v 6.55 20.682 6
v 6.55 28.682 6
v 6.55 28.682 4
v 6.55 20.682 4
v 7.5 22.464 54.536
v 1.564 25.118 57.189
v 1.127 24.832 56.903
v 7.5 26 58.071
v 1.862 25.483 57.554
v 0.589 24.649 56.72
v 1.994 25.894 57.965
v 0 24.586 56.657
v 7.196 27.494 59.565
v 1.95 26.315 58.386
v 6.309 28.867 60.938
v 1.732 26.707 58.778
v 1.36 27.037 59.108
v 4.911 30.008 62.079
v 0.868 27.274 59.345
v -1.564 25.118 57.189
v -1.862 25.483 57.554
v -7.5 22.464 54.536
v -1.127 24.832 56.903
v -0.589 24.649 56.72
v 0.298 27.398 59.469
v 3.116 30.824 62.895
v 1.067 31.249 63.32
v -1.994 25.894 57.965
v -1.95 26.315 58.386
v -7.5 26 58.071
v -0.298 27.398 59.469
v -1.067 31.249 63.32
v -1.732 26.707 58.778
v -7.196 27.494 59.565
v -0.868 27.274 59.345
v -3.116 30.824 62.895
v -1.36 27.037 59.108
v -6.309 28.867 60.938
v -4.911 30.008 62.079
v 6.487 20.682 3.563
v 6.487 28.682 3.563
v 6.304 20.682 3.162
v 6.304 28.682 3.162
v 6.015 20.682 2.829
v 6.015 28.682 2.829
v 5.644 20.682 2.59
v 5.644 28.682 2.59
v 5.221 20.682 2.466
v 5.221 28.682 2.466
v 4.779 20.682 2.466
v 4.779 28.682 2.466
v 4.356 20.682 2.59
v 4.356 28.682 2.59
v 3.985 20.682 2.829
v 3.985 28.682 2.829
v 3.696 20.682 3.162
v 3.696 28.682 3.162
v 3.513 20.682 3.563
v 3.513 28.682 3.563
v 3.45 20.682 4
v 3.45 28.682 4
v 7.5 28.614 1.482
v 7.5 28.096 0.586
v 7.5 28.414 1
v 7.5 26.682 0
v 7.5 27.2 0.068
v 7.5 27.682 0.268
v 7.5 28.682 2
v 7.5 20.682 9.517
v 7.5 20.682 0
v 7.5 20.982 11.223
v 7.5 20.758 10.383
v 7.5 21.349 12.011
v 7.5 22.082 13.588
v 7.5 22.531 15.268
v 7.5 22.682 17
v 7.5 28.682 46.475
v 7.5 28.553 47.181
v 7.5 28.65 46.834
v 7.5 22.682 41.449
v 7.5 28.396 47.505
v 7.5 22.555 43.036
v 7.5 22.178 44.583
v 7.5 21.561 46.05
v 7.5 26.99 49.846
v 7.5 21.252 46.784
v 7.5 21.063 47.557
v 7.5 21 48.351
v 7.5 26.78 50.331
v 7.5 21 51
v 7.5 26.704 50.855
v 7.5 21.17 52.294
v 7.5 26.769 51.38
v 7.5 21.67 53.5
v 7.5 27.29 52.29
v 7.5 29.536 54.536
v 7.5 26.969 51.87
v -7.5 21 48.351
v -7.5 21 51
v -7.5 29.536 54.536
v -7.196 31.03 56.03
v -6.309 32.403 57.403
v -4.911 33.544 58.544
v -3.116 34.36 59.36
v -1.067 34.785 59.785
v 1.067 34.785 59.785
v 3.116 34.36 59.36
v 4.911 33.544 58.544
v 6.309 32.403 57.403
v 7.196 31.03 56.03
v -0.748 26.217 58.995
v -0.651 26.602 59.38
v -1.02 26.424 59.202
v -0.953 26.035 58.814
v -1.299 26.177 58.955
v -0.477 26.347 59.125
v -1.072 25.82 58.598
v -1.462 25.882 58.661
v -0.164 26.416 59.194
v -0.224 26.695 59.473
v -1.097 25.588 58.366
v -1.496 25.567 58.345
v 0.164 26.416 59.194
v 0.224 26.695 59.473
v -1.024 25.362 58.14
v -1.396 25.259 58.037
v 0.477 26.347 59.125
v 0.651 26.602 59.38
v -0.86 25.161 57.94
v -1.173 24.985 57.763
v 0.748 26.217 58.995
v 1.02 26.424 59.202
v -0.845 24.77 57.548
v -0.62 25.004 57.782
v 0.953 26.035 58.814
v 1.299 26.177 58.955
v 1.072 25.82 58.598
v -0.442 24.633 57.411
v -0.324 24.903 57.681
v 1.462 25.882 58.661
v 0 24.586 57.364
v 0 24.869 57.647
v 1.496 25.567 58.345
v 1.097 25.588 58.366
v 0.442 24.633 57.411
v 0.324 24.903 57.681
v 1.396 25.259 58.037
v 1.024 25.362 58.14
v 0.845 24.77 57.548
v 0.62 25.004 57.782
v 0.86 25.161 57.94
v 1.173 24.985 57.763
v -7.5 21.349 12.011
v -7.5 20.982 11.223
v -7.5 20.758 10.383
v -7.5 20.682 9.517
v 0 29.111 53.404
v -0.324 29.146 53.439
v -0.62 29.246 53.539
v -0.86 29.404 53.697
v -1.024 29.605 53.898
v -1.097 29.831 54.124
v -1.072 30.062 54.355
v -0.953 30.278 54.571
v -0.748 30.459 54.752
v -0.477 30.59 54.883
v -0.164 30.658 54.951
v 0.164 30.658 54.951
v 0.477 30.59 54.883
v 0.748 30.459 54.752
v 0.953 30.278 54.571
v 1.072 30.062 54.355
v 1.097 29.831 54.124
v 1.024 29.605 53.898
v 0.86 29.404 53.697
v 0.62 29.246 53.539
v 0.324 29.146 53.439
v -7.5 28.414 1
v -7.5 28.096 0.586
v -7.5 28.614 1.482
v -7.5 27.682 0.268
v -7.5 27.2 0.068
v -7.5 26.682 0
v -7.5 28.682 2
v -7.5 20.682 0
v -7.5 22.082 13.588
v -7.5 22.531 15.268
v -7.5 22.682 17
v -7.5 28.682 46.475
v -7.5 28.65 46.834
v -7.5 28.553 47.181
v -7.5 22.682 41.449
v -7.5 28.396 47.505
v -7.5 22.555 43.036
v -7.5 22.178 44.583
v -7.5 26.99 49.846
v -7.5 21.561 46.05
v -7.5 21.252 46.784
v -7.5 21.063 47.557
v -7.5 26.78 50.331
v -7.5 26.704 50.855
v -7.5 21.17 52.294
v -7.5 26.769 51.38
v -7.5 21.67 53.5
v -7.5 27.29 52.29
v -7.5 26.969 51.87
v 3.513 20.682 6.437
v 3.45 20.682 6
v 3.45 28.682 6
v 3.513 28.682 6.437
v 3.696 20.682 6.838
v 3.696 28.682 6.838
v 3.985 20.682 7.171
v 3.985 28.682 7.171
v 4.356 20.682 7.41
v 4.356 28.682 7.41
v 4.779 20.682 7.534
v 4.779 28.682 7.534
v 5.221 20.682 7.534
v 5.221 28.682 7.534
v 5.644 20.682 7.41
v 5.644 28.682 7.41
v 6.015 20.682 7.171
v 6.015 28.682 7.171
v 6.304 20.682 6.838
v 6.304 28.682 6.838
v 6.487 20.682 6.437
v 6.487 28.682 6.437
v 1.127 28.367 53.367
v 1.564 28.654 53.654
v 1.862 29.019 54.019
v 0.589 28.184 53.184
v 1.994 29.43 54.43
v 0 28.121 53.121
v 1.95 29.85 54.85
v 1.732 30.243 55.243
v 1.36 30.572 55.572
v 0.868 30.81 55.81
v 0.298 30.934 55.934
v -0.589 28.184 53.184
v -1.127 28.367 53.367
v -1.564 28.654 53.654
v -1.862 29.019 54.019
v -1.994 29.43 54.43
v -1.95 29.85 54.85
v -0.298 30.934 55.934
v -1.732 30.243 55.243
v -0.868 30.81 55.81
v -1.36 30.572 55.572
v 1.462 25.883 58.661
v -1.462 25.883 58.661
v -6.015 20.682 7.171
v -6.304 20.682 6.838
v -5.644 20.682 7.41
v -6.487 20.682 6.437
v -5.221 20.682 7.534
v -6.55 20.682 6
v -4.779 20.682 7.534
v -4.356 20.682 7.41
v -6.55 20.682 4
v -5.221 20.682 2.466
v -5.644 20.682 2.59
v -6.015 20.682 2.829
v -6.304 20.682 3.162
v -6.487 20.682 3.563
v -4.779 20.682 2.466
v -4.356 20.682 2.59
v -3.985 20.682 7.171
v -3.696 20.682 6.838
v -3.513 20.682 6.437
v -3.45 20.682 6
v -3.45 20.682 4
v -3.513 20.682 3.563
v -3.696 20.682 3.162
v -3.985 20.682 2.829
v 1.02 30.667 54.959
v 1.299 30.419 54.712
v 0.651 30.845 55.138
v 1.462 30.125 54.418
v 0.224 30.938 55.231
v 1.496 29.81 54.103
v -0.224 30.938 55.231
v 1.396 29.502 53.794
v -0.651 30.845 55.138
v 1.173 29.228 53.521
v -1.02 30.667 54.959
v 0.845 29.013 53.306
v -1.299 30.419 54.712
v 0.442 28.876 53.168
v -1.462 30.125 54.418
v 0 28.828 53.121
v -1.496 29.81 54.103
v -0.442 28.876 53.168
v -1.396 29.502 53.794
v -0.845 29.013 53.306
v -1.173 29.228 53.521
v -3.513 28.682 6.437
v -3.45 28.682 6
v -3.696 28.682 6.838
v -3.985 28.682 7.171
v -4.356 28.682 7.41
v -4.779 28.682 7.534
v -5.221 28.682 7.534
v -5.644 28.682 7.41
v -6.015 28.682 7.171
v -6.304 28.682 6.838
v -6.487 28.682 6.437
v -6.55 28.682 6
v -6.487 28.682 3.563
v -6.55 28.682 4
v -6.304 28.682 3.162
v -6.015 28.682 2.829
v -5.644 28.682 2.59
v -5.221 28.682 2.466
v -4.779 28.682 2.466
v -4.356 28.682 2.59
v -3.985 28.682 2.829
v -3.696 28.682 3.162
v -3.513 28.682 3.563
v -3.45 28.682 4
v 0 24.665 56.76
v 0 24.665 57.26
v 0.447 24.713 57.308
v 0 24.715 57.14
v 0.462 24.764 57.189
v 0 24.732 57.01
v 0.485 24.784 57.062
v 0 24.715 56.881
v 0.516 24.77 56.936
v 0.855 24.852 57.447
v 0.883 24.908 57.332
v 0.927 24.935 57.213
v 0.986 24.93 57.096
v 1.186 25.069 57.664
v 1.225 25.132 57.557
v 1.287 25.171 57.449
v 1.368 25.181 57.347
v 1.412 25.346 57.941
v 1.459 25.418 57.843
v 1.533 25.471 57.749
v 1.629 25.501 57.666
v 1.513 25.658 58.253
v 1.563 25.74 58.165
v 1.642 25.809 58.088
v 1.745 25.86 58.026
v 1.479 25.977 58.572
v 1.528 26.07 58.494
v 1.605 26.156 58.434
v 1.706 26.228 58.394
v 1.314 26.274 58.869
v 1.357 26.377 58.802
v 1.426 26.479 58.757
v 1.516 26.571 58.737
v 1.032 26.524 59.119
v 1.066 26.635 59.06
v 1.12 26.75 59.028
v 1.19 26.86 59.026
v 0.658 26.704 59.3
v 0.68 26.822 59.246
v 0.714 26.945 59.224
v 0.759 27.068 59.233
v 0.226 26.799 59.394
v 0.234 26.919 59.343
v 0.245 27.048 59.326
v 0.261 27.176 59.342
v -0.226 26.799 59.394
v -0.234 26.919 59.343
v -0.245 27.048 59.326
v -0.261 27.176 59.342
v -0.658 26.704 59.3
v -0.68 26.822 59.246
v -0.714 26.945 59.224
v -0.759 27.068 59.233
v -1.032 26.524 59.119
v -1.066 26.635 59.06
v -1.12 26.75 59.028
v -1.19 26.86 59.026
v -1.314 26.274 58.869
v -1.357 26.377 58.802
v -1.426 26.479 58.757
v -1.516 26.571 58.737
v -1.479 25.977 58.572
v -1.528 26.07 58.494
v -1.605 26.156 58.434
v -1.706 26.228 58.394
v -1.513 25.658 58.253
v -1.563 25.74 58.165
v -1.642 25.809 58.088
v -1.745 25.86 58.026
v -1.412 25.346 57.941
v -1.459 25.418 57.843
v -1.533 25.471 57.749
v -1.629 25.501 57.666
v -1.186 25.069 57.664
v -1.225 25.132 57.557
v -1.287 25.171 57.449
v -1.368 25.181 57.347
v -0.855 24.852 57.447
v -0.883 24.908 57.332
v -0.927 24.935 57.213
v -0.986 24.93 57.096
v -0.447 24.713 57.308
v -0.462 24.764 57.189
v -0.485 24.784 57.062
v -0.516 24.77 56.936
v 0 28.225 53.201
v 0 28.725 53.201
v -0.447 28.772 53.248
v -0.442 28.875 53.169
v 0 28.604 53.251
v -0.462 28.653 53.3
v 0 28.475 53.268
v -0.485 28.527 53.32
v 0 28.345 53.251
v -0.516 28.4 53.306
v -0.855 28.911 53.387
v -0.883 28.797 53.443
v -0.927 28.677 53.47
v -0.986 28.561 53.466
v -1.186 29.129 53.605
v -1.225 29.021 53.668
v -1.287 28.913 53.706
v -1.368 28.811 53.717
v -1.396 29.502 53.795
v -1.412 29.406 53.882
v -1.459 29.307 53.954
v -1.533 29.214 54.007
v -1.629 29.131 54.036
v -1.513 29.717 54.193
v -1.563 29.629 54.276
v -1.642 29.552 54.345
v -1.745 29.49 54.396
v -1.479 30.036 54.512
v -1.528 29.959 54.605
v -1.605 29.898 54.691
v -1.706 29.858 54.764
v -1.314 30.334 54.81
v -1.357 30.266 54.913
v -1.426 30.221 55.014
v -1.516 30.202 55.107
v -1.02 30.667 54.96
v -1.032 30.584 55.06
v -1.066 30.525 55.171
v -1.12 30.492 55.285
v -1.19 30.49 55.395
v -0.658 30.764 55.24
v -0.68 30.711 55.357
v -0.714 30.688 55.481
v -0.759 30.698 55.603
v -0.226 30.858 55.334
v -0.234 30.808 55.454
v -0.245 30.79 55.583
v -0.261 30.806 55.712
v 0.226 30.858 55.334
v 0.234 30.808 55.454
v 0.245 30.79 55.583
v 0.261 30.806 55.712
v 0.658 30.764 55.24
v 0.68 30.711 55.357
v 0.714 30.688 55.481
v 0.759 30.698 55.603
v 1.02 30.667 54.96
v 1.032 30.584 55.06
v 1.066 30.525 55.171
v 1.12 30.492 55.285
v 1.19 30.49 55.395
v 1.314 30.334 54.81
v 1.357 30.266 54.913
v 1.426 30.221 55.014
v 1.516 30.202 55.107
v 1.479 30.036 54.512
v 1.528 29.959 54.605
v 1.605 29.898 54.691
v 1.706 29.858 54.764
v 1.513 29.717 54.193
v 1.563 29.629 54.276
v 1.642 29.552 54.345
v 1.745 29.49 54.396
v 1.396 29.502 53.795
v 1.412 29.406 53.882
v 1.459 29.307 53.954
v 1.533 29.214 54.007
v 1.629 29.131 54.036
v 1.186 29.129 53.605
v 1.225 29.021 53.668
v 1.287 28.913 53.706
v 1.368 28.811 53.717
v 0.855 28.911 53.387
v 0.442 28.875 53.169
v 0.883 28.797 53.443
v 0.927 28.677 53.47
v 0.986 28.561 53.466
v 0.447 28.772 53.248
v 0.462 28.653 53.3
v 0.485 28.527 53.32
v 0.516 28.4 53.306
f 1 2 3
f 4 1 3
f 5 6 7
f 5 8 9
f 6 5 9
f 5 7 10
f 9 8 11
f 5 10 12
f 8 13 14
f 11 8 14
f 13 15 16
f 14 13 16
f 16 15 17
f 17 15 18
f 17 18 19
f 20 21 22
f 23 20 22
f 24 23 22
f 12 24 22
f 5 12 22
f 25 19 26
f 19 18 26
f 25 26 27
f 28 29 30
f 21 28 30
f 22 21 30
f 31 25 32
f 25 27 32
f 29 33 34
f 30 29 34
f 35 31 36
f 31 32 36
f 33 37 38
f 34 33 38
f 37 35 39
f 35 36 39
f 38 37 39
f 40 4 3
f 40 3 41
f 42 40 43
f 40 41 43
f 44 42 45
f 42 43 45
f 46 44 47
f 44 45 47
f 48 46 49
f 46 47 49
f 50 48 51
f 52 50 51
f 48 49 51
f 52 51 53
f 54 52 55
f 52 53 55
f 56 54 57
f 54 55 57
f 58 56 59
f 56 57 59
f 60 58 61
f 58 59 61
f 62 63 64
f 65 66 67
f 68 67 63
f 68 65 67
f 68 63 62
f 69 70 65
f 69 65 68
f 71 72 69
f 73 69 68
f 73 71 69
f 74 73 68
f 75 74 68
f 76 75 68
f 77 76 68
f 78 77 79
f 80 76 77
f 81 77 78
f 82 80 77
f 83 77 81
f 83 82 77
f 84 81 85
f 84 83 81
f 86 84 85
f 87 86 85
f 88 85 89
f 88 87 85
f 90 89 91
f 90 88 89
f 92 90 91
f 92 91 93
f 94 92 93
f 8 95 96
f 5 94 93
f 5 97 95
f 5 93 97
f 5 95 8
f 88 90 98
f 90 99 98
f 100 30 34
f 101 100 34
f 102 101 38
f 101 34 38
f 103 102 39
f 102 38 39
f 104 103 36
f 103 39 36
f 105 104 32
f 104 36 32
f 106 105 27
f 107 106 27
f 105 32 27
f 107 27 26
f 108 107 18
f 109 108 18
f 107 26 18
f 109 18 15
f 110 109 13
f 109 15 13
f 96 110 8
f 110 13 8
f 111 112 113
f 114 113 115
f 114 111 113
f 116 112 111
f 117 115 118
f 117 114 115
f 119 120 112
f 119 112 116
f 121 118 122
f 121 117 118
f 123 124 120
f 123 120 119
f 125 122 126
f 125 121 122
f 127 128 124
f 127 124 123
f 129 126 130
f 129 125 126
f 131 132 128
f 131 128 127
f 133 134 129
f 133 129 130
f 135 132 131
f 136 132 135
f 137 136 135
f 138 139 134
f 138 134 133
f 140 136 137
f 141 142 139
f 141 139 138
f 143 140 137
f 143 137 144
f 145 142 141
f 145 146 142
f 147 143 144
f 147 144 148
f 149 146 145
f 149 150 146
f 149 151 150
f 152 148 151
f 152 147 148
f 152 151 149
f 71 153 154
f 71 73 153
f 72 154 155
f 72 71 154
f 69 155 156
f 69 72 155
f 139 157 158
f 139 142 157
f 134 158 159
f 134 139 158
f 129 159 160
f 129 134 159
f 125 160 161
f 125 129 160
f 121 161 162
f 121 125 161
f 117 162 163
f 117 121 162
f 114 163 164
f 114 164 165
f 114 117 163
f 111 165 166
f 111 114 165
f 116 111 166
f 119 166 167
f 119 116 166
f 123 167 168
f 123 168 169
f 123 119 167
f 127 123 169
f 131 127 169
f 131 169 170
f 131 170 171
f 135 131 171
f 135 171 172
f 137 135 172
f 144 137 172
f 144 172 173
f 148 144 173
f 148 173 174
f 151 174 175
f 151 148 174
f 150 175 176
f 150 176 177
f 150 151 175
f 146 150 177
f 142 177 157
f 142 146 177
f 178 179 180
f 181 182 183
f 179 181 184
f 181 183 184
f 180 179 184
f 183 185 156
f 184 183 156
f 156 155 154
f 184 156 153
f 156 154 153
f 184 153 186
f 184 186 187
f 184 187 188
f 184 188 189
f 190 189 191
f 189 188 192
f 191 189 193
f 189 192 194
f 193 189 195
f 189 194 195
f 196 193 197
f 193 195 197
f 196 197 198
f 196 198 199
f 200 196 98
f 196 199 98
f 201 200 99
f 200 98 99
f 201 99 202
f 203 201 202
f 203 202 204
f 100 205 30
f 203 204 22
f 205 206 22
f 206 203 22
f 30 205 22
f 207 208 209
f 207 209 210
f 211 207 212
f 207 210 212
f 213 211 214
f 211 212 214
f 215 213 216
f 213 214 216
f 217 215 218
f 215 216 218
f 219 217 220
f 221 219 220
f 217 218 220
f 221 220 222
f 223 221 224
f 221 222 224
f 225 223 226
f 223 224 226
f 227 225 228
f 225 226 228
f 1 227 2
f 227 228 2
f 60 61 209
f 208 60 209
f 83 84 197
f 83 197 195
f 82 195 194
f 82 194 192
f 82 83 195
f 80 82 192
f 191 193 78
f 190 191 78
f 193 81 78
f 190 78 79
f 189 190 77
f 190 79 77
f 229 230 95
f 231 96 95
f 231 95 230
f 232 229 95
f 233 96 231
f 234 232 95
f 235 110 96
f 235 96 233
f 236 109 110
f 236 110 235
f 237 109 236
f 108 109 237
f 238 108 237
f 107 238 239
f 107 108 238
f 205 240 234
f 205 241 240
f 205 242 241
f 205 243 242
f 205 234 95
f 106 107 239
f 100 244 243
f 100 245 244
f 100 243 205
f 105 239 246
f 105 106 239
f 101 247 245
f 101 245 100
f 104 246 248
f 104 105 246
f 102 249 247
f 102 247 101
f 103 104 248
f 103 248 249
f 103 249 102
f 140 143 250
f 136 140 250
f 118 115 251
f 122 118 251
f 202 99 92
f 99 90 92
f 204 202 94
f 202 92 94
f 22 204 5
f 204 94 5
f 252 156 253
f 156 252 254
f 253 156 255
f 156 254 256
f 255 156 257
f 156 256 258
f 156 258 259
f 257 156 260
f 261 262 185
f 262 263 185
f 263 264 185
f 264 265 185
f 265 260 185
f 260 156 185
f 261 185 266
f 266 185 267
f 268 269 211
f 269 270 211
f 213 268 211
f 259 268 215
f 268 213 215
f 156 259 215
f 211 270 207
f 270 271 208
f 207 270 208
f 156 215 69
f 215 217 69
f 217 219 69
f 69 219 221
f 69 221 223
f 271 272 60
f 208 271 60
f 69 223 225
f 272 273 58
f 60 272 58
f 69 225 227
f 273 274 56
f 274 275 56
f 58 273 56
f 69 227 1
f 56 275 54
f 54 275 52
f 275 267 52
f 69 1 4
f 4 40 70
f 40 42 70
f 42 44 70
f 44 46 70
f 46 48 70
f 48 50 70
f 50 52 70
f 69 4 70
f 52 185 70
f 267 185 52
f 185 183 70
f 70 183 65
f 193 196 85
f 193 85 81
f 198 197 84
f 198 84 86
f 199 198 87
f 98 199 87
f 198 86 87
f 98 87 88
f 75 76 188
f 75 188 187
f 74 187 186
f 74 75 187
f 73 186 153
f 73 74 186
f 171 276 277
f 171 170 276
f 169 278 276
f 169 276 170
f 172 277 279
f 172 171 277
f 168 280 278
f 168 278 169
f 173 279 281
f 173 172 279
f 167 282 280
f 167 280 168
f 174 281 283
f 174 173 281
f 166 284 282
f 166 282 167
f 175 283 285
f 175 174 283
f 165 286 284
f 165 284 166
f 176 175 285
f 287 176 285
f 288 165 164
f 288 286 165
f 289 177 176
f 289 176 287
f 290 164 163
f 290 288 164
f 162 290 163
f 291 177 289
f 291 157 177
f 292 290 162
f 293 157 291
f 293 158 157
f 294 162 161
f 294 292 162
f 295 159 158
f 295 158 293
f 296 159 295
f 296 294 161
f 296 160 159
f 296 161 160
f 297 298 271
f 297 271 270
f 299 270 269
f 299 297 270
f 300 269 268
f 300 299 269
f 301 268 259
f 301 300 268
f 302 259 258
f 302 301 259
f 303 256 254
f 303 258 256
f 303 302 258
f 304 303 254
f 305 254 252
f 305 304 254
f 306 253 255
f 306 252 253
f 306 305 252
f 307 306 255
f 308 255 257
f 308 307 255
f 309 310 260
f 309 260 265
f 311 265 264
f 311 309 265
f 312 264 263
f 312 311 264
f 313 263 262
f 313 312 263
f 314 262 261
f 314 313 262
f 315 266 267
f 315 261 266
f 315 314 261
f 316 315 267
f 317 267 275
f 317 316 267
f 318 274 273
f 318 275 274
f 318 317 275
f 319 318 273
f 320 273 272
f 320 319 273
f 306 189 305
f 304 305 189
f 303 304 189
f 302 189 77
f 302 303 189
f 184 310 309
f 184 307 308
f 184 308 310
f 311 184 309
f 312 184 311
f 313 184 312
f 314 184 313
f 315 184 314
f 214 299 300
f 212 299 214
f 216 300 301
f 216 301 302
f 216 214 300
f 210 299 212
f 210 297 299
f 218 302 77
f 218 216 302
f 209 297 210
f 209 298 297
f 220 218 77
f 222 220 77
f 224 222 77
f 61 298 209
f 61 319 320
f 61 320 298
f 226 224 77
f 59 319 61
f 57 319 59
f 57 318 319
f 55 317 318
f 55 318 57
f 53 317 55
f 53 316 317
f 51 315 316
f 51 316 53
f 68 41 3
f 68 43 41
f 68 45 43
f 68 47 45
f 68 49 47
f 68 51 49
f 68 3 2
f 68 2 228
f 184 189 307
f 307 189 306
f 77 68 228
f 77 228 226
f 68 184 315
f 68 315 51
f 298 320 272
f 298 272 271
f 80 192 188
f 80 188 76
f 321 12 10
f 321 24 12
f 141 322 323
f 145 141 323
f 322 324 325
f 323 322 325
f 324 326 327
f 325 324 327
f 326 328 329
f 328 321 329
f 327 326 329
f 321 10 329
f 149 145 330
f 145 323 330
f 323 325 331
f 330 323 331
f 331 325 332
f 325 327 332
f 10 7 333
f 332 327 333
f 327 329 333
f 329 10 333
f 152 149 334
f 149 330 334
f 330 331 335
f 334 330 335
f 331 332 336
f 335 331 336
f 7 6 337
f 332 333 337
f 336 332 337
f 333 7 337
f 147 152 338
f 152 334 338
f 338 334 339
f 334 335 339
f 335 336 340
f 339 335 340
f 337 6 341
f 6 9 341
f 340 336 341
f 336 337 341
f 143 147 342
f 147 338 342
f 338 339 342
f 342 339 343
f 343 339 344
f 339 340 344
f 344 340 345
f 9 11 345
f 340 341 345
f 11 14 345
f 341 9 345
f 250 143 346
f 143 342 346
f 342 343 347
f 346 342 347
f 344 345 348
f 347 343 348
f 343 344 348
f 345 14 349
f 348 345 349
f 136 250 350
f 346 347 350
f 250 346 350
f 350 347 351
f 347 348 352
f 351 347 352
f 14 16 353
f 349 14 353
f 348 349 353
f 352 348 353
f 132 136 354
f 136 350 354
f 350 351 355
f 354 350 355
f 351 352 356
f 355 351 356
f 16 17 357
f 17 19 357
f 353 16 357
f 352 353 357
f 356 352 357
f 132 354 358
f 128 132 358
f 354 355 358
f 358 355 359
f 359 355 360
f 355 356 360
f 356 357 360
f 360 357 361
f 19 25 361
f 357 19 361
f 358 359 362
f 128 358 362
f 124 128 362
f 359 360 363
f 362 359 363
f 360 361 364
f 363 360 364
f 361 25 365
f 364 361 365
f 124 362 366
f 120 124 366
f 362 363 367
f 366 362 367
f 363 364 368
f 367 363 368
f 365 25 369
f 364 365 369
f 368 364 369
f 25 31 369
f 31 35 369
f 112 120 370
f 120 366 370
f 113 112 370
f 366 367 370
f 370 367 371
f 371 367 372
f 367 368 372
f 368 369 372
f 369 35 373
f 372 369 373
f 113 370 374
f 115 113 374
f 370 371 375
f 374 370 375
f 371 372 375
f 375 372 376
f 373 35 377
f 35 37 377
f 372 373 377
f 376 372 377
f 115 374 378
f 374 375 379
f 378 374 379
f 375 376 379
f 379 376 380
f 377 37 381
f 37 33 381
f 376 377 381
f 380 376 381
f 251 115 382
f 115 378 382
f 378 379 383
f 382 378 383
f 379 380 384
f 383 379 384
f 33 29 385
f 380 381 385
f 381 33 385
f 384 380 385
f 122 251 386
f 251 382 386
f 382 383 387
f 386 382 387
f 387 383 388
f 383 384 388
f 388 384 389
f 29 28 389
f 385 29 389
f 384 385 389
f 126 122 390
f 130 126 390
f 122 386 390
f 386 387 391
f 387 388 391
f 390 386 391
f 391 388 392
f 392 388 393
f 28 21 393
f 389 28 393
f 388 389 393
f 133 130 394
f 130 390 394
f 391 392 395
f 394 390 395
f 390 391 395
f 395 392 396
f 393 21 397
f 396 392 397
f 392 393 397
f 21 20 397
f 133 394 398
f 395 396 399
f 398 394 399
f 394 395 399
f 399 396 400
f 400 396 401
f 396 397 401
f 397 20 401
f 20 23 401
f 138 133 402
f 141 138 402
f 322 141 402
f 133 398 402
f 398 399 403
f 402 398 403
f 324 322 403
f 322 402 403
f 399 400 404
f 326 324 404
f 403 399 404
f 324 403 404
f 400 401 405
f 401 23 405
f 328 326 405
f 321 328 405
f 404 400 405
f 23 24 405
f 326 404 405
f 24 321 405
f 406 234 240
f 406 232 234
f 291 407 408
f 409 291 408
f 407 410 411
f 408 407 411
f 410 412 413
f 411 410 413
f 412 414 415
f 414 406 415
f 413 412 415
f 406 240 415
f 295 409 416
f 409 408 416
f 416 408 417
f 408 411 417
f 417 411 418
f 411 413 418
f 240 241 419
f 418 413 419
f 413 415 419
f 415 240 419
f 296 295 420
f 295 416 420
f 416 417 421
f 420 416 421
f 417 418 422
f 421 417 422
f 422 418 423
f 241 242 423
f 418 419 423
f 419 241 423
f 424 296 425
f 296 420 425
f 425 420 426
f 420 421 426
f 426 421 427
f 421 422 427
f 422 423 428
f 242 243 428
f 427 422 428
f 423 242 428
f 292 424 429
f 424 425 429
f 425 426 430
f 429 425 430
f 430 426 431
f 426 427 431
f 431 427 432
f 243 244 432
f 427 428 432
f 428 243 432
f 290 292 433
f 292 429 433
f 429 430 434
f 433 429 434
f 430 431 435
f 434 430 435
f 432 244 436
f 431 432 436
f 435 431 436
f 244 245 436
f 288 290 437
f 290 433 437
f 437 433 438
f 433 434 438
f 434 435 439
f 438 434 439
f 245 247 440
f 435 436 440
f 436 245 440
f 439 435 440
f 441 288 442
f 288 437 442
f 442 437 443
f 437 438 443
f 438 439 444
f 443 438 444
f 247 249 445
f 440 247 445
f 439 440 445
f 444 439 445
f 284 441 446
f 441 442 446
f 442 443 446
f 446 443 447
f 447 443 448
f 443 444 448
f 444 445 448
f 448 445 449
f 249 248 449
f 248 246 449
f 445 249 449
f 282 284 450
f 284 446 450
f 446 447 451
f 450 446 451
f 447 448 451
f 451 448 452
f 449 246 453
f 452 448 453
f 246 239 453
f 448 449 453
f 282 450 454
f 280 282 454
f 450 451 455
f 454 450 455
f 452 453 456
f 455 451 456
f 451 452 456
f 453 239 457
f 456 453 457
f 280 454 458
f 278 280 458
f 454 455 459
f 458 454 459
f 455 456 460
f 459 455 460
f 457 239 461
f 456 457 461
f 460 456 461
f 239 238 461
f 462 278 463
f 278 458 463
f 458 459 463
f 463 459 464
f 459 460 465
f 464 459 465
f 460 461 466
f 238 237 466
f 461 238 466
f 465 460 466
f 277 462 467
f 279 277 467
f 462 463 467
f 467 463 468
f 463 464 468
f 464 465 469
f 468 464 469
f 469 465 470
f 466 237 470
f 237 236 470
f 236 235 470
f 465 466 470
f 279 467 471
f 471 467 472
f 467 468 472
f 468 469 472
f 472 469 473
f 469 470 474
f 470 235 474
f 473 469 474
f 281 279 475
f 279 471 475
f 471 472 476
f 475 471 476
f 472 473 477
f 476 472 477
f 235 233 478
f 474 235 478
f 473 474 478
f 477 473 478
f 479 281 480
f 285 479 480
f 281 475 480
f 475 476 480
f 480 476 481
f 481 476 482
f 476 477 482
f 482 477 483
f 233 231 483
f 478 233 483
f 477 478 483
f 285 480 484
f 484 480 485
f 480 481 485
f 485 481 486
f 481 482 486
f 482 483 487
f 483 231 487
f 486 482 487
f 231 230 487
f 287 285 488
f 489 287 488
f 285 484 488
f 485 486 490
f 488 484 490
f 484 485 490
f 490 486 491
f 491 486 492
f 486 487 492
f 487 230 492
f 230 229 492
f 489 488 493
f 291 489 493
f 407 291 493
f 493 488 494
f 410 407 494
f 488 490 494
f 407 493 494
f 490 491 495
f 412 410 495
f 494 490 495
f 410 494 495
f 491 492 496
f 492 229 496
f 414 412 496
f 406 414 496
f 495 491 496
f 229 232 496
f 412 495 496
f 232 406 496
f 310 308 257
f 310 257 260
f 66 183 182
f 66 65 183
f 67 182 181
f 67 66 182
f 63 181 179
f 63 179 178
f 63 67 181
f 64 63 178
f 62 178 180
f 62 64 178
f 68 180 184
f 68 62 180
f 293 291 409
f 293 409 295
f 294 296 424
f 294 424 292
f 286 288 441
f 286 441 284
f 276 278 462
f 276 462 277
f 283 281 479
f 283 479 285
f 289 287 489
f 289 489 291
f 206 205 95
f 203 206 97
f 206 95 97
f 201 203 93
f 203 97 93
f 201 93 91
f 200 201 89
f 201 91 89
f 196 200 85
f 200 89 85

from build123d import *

# Parameters (mm, degrees)
SKETCH_10_W         = 15
SKETCH_10_H         = 8
EXTRUDE_7_DEPTH     = 41
CUT_EXTRUDE_4_DEPTH = 11
SKETCH_12_W         = 15
SKETCH_12_H         = 6
EXTRUDE_8_DEPTH     = 6
SKETCH_14_W         = 15
SKETCH_14_H         = 5
EXTRUDE_9_DEPTH     = 4
EXTRUDE_10_DEPTH    = 15
EXTRUDE_11_DEPTH    = 5
SKETCH_19_R         = 1.1
CUT_EXTRUDE_5_DEPTH = 5
EXTRUDE_START       = 0.5
SKETCH_20_R         = 1.5
SKETCH_20_R_2       = 1.1
EXTRUDE_12_DEPTH    = 0.5
SKETCH_21_R         = 1.5
SKETCH_21_R_2       = 1.1
EXTRUDE_13_DEPTH    = 0.5
FILLET_4_R          = 0.5
CHAMFER_1_SIZE      = 4.493554602
CHAMFER_1_SIZE_2    = 2.7
FILLET_7_R          = 2
SKETCH_23_W         = 15
SKETCH_23_H         = 2
CUT_EXTRUDE_6_DEPTH = 30
FILLET_8_R          = 10
FILLET_9_R          = 5
FILLET_10_R         = 2


# Some blends are built 0.0001 mm under size
with BuildPart() as part:
    # 草图10 → 凸台-拉伸7 (new body)
    with BuildSketch(Plane.XY):
        with Locations((0, 24.68211788)):
            Rectangle(SKETCH_10_W, SKETCH_10_H)
    extrude(amount=EXTRUDE_7_DEPTH)

    # 草图11 → 切除-拉伸4 (cut)
    with BuildSketch(Plane(origin=(0, 28.68211788, 0), x_dir=(1, 0, 0), z_dir=(0, 1, 0))):
        with BuildLine():
            Line((-3.45, -4), (-3.45, -6))
            ThreePointArc((-3.45, -6), (-5, -7.55), (-6.55, -6))
            Line((-6.55, -6), (-6.55, -4))
            ThreePointArc((-6.55, -4), (-5, -2.45), (-3.45, -4))
        make_face()
        with BuildLine():
            Line((3.45, -4), (3.45, -6))
            ThreePointArc((3.45, -6), (5, -7.55), (6.55, -6))
            Line((6.55, -6), (6.55, -4))
            ThreePointArc((6.55, -4), (5, -2.45), (3.45, -4))
        make_face()
    extrude(amount=-CUT_EXTRUDE_4_DEPTH, mode=Mode.SUBTRACT)

    # 草图12 → 凸台-拉伸8 (add)
    with BuildSketch(Plane.XY.offset(41)):
        with Locations((0, 25.68211788)):
            Rectangle(SKETCH_12_W, SKETCH_12_H)
    extrude(amount=EXTRUDE_8_DEPTH)

    # 草图14 → 凸台-拉伸9 (add)
    with BuildSketch(Plane.XY.offset(47)):
        with Locations((0, 23.5)):
            Rectangle(SKETCH_14_W, SKETCH_14_H)
    extrude(amount=EXTRUDE_9_DEPTH)

    # 草图17 → 凸台-拉伸10 (add)
    with BuildSketch(Plane.ZY.offset(7.5)):
        Polygon((51, 26), (54.535533906, 29.535533906), (58.071067812, 26), (53.071067812, 21), (51, 21), align=None)
    extrude(amount=-EXTRUDE_10_DEPTH)

    # 草图18 → 凸台-拉伸11 (add)
    with BuildSketch(Plane(origin=(0, -16.035533906, 16.035533906), x_dir=(1, 0, 0), z_dir=(0, -0.7071067811865507, 0.7071067811865445))):
        with BuildLine():
            Line((7.5, 59.447222151), (-7.5, 59.447222151))
            ThreePointArc((-7.5, 59.447222151), (0, 66.947222151), (7.5, 59.447222151))
        make_face()
    extrude(amount=-EXTRUDE_11_DEPTH)

    # 草图19 → 切除-拉伸5 (cut)
    with BuildSketch(Plane(origin=(0, -16.035533906, 16.035533906), x_dir=(1, 0, 0), z_dir=(0, -0.7071067811865507, 0.7071067811865445))):
        with Locations(Location((0, 59.447222151, 0), (0, 0, 270))):
            Circle(SKETCH_19_R)
    extrude(amount=-CUT_EXTRUDE_5_DEPTH, mode=Mode.SUBTRACT)

    # 草图20 → 凸台-拉伸12 (add)
    with BuildSketch(Plane(origin=(0, -16.035533906, 16.035533906), x_dir=(1, 0, 0), z_dir=(0, -0.7071067811865507, 0.7071067811865445)).offset(EXTRUDE_START)):
        with Locations(Location((0, 59.447222151, 0), (0, 0, 270))):
            Circle(SKETCH_20_R)
        with Locations(Location((0, 59.447222151, 0), (0, 0, 270))):
            Circle(SKETCH_20_R_2, mode=Mode.SUBTRACT)
    extrude(amount=-EXTRUDE_12_DEPTH)

    # 草图21 → 凸台-拉伸13 (add)
    with BuildSketch(Plane(origin=(0, -12.5, 12.5), x_dir=(1, 0, 0), z_dir=(0, 0.7071067811865513, -0.7071067811865437))):
        with Locations(Location((0, -59.447222151, 0), (0, 0, 90))):
            Circle(SKETCH_21_R)
        with Locations(Location((0, -59.447222151, 0), (0, 0, 90))):
            Circle(SKETCH_21_R_2, mode=Mode.SUBTRACT)
    extrude(amount=EXTRUDE_13_DEPTH)

    # 圆角4
    fillet_4_edges = [part.edges().sort_by_distance(p)[0] for p in [
        (0, 27.060660172, 59.131727984),
        (0, 30.596194078, 55.596194078),
    ]]
    fillet(fillet_4_edges, radius=FILLET_4_R - 0.0001)  # a hair under: the kernel refuses the full size

    # 倒角1
    # the kernel refuses this chamfer: 4.493554602, 2.7 mm, written as the material it adds along each edge
    with BuildSketch(Plane(origin=(-7.5, 26, 47), x_dir=(0, -0.019914630580833353, 0.9998016840798123), z_dir=(1, 0, 0))) as chamfer_1_piece_1_section:
        Polygon((CHAMFER_1_SIZE * 0.999801684157, -CHAMFER_1_SIZE * 0.0199146305824), (-CHAMFER_1_SIZE_2 * 0.0199146305808, -CHAMFER_1_SIZE_2 * 0.99980168408), (0, 0), align=None)
    chamfer_1_piece_1 = extrude(amount=15, mode=Mode.PRIVATE)
    chamfer_1_piece_1 = split(chamfer_1_piece_1, bisect_by=Plane(origin=(0, 28.68211788, 48.477199106), z_dir=(0, -1, 0)), keep=Keep.TOP, mode=Mode.PRIVATE)
    add(chamfer_1_piece_1)

    # 圆角7
    fillet_7_edges = [part.edges().sort_by_distance(p)[0] for p in [
        (0, 26.18524881, 51.18524881),
        (0, 28.68211788, 47.029760846),
    ]]
    fillet(fillet_7_edges, radius=FILLET_7_R)

    # 草图23 → 切除-拉伸6 (cut)
    with BuildSketch(Plane.XY.offset(41)):
        with Locations((0, 21.68211788)):
            Rectangle(SKETCH_23_W, SKETCH_23_H)
    extrude(amount=-CUT_EXTRUDE_6_DEPTH, mode=Mode.SUBTRACT)

    # 圆角8
    # the kernel refuses this fillet: 10 mm, written as the material it adds along each edge
    with BuildSketch(Plane(origin=(7.5, 22.68211788, 11), x_dir=(0, -1, 0), z_dir=(-1, 0, 0))) as fillet_8_piece_1:
        with BuildLine():
            CenterArc((10, 6), FILLET_8_R, 180, 36.869897646)
            Line((0, 6), (-0.2, 6))
            Line((-0.2, 6), (-0.2, 0))
            Line((-0.2, 0), (0, -0.2))
            ThreePointArc((0, -0.2), (1, -0.2), (1.84, -0.12))
            Line((1.84, -0.12), (2, 0))
        make_face()
    extrude(amount=15)
    with BuildSketch(Plane(origin=(7.5, 22.68211788, 47), x_dir=(0, 0, -1), z_dir=(-1, 0, 0))) as fillet_8_piece_2:
        with BuildLine():
            CenterArc((5.550931186, 10), FILLET_8_R, 236.282871199, 33.717128801)
            Line((0, 1.68211788), (-0.111018624, 1.515760238))
            ThreePointArc((-0.111018624, 1.515760238), (-0.2, 0.84105894), (-0.2, 0))
            Line((-0.2, 0), (0, -0.2))
            Line((0, -0.2), (5.550931186, -0.2))
            Line((5.550931186, -0.2), (5.550931186, 0))
        make_face()
    extrude(amount=15)

    # 圆角9
    fillet_9_edges = [part.edges().sort_by_distance(p)[0] for p in [
        (0, 20.68211788, 11),
        (0, 21, 47),
        (0, 21, 53.071067812),
    ]]
    fillet(fillet_9_edges, radius=FILLET_9_R)

    # 圆角10
    fillet_10_edges = [part.edges().sort_by_distance(p)[0] for p in [
        (0, 28.68211788, 0),
    ]]
    fillet(fillet_10_edges, radius=FILLET_10_R)


solid = part.part
